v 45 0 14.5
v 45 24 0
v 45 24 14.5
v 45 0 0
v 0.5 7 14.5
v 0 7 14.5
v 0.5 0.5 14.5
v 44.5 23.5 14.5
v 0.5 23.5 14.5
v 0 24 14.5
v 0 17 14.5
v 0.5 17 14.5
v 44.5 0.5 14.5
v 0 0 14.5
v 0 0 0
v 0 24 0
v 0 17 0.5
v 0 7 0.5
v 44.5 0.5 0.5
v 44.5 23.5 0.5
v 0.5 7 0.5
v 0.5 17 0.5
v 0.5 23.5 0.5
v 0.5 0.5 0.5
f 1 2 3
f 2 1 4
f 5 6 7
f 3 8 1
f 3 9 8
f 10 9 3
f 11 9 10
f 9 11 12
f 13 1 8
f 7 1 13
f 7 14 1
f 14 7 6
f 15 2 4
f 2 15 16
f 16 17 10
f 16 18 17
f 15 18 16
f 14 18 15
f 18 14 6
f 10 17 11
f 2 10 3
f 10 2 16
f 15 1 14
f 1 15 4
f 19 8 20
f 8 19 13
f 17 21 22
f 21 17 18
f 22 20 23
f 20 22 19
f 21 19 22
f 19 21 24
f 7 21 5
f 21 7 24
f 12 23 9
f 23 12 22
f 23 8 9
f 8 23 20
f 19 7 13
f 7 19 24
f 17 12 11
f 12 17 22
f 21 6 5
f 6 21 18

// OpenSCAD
module razor_blade_dumpster(wall = 0.5)
{
  eps = 0.01;
  h = 0.2;  // h of a single blade
  N = 20;
  side_cut_wide = 10;
  in_size = [ 43+2, 22+2, h*N+wall+10];
  difference()
  {
    cube(in_size);
    translate(wall*[1,1,1])
      cube(in_size - wall*[2,2,0]);
    // side cut
    translate([-eps, in_size.y/2 - side_cut_wide/2, wall])
      cube([wall+2*eps, side_cut_wide, in_size.z]);
  }
}


razor_blade_dumpster();
